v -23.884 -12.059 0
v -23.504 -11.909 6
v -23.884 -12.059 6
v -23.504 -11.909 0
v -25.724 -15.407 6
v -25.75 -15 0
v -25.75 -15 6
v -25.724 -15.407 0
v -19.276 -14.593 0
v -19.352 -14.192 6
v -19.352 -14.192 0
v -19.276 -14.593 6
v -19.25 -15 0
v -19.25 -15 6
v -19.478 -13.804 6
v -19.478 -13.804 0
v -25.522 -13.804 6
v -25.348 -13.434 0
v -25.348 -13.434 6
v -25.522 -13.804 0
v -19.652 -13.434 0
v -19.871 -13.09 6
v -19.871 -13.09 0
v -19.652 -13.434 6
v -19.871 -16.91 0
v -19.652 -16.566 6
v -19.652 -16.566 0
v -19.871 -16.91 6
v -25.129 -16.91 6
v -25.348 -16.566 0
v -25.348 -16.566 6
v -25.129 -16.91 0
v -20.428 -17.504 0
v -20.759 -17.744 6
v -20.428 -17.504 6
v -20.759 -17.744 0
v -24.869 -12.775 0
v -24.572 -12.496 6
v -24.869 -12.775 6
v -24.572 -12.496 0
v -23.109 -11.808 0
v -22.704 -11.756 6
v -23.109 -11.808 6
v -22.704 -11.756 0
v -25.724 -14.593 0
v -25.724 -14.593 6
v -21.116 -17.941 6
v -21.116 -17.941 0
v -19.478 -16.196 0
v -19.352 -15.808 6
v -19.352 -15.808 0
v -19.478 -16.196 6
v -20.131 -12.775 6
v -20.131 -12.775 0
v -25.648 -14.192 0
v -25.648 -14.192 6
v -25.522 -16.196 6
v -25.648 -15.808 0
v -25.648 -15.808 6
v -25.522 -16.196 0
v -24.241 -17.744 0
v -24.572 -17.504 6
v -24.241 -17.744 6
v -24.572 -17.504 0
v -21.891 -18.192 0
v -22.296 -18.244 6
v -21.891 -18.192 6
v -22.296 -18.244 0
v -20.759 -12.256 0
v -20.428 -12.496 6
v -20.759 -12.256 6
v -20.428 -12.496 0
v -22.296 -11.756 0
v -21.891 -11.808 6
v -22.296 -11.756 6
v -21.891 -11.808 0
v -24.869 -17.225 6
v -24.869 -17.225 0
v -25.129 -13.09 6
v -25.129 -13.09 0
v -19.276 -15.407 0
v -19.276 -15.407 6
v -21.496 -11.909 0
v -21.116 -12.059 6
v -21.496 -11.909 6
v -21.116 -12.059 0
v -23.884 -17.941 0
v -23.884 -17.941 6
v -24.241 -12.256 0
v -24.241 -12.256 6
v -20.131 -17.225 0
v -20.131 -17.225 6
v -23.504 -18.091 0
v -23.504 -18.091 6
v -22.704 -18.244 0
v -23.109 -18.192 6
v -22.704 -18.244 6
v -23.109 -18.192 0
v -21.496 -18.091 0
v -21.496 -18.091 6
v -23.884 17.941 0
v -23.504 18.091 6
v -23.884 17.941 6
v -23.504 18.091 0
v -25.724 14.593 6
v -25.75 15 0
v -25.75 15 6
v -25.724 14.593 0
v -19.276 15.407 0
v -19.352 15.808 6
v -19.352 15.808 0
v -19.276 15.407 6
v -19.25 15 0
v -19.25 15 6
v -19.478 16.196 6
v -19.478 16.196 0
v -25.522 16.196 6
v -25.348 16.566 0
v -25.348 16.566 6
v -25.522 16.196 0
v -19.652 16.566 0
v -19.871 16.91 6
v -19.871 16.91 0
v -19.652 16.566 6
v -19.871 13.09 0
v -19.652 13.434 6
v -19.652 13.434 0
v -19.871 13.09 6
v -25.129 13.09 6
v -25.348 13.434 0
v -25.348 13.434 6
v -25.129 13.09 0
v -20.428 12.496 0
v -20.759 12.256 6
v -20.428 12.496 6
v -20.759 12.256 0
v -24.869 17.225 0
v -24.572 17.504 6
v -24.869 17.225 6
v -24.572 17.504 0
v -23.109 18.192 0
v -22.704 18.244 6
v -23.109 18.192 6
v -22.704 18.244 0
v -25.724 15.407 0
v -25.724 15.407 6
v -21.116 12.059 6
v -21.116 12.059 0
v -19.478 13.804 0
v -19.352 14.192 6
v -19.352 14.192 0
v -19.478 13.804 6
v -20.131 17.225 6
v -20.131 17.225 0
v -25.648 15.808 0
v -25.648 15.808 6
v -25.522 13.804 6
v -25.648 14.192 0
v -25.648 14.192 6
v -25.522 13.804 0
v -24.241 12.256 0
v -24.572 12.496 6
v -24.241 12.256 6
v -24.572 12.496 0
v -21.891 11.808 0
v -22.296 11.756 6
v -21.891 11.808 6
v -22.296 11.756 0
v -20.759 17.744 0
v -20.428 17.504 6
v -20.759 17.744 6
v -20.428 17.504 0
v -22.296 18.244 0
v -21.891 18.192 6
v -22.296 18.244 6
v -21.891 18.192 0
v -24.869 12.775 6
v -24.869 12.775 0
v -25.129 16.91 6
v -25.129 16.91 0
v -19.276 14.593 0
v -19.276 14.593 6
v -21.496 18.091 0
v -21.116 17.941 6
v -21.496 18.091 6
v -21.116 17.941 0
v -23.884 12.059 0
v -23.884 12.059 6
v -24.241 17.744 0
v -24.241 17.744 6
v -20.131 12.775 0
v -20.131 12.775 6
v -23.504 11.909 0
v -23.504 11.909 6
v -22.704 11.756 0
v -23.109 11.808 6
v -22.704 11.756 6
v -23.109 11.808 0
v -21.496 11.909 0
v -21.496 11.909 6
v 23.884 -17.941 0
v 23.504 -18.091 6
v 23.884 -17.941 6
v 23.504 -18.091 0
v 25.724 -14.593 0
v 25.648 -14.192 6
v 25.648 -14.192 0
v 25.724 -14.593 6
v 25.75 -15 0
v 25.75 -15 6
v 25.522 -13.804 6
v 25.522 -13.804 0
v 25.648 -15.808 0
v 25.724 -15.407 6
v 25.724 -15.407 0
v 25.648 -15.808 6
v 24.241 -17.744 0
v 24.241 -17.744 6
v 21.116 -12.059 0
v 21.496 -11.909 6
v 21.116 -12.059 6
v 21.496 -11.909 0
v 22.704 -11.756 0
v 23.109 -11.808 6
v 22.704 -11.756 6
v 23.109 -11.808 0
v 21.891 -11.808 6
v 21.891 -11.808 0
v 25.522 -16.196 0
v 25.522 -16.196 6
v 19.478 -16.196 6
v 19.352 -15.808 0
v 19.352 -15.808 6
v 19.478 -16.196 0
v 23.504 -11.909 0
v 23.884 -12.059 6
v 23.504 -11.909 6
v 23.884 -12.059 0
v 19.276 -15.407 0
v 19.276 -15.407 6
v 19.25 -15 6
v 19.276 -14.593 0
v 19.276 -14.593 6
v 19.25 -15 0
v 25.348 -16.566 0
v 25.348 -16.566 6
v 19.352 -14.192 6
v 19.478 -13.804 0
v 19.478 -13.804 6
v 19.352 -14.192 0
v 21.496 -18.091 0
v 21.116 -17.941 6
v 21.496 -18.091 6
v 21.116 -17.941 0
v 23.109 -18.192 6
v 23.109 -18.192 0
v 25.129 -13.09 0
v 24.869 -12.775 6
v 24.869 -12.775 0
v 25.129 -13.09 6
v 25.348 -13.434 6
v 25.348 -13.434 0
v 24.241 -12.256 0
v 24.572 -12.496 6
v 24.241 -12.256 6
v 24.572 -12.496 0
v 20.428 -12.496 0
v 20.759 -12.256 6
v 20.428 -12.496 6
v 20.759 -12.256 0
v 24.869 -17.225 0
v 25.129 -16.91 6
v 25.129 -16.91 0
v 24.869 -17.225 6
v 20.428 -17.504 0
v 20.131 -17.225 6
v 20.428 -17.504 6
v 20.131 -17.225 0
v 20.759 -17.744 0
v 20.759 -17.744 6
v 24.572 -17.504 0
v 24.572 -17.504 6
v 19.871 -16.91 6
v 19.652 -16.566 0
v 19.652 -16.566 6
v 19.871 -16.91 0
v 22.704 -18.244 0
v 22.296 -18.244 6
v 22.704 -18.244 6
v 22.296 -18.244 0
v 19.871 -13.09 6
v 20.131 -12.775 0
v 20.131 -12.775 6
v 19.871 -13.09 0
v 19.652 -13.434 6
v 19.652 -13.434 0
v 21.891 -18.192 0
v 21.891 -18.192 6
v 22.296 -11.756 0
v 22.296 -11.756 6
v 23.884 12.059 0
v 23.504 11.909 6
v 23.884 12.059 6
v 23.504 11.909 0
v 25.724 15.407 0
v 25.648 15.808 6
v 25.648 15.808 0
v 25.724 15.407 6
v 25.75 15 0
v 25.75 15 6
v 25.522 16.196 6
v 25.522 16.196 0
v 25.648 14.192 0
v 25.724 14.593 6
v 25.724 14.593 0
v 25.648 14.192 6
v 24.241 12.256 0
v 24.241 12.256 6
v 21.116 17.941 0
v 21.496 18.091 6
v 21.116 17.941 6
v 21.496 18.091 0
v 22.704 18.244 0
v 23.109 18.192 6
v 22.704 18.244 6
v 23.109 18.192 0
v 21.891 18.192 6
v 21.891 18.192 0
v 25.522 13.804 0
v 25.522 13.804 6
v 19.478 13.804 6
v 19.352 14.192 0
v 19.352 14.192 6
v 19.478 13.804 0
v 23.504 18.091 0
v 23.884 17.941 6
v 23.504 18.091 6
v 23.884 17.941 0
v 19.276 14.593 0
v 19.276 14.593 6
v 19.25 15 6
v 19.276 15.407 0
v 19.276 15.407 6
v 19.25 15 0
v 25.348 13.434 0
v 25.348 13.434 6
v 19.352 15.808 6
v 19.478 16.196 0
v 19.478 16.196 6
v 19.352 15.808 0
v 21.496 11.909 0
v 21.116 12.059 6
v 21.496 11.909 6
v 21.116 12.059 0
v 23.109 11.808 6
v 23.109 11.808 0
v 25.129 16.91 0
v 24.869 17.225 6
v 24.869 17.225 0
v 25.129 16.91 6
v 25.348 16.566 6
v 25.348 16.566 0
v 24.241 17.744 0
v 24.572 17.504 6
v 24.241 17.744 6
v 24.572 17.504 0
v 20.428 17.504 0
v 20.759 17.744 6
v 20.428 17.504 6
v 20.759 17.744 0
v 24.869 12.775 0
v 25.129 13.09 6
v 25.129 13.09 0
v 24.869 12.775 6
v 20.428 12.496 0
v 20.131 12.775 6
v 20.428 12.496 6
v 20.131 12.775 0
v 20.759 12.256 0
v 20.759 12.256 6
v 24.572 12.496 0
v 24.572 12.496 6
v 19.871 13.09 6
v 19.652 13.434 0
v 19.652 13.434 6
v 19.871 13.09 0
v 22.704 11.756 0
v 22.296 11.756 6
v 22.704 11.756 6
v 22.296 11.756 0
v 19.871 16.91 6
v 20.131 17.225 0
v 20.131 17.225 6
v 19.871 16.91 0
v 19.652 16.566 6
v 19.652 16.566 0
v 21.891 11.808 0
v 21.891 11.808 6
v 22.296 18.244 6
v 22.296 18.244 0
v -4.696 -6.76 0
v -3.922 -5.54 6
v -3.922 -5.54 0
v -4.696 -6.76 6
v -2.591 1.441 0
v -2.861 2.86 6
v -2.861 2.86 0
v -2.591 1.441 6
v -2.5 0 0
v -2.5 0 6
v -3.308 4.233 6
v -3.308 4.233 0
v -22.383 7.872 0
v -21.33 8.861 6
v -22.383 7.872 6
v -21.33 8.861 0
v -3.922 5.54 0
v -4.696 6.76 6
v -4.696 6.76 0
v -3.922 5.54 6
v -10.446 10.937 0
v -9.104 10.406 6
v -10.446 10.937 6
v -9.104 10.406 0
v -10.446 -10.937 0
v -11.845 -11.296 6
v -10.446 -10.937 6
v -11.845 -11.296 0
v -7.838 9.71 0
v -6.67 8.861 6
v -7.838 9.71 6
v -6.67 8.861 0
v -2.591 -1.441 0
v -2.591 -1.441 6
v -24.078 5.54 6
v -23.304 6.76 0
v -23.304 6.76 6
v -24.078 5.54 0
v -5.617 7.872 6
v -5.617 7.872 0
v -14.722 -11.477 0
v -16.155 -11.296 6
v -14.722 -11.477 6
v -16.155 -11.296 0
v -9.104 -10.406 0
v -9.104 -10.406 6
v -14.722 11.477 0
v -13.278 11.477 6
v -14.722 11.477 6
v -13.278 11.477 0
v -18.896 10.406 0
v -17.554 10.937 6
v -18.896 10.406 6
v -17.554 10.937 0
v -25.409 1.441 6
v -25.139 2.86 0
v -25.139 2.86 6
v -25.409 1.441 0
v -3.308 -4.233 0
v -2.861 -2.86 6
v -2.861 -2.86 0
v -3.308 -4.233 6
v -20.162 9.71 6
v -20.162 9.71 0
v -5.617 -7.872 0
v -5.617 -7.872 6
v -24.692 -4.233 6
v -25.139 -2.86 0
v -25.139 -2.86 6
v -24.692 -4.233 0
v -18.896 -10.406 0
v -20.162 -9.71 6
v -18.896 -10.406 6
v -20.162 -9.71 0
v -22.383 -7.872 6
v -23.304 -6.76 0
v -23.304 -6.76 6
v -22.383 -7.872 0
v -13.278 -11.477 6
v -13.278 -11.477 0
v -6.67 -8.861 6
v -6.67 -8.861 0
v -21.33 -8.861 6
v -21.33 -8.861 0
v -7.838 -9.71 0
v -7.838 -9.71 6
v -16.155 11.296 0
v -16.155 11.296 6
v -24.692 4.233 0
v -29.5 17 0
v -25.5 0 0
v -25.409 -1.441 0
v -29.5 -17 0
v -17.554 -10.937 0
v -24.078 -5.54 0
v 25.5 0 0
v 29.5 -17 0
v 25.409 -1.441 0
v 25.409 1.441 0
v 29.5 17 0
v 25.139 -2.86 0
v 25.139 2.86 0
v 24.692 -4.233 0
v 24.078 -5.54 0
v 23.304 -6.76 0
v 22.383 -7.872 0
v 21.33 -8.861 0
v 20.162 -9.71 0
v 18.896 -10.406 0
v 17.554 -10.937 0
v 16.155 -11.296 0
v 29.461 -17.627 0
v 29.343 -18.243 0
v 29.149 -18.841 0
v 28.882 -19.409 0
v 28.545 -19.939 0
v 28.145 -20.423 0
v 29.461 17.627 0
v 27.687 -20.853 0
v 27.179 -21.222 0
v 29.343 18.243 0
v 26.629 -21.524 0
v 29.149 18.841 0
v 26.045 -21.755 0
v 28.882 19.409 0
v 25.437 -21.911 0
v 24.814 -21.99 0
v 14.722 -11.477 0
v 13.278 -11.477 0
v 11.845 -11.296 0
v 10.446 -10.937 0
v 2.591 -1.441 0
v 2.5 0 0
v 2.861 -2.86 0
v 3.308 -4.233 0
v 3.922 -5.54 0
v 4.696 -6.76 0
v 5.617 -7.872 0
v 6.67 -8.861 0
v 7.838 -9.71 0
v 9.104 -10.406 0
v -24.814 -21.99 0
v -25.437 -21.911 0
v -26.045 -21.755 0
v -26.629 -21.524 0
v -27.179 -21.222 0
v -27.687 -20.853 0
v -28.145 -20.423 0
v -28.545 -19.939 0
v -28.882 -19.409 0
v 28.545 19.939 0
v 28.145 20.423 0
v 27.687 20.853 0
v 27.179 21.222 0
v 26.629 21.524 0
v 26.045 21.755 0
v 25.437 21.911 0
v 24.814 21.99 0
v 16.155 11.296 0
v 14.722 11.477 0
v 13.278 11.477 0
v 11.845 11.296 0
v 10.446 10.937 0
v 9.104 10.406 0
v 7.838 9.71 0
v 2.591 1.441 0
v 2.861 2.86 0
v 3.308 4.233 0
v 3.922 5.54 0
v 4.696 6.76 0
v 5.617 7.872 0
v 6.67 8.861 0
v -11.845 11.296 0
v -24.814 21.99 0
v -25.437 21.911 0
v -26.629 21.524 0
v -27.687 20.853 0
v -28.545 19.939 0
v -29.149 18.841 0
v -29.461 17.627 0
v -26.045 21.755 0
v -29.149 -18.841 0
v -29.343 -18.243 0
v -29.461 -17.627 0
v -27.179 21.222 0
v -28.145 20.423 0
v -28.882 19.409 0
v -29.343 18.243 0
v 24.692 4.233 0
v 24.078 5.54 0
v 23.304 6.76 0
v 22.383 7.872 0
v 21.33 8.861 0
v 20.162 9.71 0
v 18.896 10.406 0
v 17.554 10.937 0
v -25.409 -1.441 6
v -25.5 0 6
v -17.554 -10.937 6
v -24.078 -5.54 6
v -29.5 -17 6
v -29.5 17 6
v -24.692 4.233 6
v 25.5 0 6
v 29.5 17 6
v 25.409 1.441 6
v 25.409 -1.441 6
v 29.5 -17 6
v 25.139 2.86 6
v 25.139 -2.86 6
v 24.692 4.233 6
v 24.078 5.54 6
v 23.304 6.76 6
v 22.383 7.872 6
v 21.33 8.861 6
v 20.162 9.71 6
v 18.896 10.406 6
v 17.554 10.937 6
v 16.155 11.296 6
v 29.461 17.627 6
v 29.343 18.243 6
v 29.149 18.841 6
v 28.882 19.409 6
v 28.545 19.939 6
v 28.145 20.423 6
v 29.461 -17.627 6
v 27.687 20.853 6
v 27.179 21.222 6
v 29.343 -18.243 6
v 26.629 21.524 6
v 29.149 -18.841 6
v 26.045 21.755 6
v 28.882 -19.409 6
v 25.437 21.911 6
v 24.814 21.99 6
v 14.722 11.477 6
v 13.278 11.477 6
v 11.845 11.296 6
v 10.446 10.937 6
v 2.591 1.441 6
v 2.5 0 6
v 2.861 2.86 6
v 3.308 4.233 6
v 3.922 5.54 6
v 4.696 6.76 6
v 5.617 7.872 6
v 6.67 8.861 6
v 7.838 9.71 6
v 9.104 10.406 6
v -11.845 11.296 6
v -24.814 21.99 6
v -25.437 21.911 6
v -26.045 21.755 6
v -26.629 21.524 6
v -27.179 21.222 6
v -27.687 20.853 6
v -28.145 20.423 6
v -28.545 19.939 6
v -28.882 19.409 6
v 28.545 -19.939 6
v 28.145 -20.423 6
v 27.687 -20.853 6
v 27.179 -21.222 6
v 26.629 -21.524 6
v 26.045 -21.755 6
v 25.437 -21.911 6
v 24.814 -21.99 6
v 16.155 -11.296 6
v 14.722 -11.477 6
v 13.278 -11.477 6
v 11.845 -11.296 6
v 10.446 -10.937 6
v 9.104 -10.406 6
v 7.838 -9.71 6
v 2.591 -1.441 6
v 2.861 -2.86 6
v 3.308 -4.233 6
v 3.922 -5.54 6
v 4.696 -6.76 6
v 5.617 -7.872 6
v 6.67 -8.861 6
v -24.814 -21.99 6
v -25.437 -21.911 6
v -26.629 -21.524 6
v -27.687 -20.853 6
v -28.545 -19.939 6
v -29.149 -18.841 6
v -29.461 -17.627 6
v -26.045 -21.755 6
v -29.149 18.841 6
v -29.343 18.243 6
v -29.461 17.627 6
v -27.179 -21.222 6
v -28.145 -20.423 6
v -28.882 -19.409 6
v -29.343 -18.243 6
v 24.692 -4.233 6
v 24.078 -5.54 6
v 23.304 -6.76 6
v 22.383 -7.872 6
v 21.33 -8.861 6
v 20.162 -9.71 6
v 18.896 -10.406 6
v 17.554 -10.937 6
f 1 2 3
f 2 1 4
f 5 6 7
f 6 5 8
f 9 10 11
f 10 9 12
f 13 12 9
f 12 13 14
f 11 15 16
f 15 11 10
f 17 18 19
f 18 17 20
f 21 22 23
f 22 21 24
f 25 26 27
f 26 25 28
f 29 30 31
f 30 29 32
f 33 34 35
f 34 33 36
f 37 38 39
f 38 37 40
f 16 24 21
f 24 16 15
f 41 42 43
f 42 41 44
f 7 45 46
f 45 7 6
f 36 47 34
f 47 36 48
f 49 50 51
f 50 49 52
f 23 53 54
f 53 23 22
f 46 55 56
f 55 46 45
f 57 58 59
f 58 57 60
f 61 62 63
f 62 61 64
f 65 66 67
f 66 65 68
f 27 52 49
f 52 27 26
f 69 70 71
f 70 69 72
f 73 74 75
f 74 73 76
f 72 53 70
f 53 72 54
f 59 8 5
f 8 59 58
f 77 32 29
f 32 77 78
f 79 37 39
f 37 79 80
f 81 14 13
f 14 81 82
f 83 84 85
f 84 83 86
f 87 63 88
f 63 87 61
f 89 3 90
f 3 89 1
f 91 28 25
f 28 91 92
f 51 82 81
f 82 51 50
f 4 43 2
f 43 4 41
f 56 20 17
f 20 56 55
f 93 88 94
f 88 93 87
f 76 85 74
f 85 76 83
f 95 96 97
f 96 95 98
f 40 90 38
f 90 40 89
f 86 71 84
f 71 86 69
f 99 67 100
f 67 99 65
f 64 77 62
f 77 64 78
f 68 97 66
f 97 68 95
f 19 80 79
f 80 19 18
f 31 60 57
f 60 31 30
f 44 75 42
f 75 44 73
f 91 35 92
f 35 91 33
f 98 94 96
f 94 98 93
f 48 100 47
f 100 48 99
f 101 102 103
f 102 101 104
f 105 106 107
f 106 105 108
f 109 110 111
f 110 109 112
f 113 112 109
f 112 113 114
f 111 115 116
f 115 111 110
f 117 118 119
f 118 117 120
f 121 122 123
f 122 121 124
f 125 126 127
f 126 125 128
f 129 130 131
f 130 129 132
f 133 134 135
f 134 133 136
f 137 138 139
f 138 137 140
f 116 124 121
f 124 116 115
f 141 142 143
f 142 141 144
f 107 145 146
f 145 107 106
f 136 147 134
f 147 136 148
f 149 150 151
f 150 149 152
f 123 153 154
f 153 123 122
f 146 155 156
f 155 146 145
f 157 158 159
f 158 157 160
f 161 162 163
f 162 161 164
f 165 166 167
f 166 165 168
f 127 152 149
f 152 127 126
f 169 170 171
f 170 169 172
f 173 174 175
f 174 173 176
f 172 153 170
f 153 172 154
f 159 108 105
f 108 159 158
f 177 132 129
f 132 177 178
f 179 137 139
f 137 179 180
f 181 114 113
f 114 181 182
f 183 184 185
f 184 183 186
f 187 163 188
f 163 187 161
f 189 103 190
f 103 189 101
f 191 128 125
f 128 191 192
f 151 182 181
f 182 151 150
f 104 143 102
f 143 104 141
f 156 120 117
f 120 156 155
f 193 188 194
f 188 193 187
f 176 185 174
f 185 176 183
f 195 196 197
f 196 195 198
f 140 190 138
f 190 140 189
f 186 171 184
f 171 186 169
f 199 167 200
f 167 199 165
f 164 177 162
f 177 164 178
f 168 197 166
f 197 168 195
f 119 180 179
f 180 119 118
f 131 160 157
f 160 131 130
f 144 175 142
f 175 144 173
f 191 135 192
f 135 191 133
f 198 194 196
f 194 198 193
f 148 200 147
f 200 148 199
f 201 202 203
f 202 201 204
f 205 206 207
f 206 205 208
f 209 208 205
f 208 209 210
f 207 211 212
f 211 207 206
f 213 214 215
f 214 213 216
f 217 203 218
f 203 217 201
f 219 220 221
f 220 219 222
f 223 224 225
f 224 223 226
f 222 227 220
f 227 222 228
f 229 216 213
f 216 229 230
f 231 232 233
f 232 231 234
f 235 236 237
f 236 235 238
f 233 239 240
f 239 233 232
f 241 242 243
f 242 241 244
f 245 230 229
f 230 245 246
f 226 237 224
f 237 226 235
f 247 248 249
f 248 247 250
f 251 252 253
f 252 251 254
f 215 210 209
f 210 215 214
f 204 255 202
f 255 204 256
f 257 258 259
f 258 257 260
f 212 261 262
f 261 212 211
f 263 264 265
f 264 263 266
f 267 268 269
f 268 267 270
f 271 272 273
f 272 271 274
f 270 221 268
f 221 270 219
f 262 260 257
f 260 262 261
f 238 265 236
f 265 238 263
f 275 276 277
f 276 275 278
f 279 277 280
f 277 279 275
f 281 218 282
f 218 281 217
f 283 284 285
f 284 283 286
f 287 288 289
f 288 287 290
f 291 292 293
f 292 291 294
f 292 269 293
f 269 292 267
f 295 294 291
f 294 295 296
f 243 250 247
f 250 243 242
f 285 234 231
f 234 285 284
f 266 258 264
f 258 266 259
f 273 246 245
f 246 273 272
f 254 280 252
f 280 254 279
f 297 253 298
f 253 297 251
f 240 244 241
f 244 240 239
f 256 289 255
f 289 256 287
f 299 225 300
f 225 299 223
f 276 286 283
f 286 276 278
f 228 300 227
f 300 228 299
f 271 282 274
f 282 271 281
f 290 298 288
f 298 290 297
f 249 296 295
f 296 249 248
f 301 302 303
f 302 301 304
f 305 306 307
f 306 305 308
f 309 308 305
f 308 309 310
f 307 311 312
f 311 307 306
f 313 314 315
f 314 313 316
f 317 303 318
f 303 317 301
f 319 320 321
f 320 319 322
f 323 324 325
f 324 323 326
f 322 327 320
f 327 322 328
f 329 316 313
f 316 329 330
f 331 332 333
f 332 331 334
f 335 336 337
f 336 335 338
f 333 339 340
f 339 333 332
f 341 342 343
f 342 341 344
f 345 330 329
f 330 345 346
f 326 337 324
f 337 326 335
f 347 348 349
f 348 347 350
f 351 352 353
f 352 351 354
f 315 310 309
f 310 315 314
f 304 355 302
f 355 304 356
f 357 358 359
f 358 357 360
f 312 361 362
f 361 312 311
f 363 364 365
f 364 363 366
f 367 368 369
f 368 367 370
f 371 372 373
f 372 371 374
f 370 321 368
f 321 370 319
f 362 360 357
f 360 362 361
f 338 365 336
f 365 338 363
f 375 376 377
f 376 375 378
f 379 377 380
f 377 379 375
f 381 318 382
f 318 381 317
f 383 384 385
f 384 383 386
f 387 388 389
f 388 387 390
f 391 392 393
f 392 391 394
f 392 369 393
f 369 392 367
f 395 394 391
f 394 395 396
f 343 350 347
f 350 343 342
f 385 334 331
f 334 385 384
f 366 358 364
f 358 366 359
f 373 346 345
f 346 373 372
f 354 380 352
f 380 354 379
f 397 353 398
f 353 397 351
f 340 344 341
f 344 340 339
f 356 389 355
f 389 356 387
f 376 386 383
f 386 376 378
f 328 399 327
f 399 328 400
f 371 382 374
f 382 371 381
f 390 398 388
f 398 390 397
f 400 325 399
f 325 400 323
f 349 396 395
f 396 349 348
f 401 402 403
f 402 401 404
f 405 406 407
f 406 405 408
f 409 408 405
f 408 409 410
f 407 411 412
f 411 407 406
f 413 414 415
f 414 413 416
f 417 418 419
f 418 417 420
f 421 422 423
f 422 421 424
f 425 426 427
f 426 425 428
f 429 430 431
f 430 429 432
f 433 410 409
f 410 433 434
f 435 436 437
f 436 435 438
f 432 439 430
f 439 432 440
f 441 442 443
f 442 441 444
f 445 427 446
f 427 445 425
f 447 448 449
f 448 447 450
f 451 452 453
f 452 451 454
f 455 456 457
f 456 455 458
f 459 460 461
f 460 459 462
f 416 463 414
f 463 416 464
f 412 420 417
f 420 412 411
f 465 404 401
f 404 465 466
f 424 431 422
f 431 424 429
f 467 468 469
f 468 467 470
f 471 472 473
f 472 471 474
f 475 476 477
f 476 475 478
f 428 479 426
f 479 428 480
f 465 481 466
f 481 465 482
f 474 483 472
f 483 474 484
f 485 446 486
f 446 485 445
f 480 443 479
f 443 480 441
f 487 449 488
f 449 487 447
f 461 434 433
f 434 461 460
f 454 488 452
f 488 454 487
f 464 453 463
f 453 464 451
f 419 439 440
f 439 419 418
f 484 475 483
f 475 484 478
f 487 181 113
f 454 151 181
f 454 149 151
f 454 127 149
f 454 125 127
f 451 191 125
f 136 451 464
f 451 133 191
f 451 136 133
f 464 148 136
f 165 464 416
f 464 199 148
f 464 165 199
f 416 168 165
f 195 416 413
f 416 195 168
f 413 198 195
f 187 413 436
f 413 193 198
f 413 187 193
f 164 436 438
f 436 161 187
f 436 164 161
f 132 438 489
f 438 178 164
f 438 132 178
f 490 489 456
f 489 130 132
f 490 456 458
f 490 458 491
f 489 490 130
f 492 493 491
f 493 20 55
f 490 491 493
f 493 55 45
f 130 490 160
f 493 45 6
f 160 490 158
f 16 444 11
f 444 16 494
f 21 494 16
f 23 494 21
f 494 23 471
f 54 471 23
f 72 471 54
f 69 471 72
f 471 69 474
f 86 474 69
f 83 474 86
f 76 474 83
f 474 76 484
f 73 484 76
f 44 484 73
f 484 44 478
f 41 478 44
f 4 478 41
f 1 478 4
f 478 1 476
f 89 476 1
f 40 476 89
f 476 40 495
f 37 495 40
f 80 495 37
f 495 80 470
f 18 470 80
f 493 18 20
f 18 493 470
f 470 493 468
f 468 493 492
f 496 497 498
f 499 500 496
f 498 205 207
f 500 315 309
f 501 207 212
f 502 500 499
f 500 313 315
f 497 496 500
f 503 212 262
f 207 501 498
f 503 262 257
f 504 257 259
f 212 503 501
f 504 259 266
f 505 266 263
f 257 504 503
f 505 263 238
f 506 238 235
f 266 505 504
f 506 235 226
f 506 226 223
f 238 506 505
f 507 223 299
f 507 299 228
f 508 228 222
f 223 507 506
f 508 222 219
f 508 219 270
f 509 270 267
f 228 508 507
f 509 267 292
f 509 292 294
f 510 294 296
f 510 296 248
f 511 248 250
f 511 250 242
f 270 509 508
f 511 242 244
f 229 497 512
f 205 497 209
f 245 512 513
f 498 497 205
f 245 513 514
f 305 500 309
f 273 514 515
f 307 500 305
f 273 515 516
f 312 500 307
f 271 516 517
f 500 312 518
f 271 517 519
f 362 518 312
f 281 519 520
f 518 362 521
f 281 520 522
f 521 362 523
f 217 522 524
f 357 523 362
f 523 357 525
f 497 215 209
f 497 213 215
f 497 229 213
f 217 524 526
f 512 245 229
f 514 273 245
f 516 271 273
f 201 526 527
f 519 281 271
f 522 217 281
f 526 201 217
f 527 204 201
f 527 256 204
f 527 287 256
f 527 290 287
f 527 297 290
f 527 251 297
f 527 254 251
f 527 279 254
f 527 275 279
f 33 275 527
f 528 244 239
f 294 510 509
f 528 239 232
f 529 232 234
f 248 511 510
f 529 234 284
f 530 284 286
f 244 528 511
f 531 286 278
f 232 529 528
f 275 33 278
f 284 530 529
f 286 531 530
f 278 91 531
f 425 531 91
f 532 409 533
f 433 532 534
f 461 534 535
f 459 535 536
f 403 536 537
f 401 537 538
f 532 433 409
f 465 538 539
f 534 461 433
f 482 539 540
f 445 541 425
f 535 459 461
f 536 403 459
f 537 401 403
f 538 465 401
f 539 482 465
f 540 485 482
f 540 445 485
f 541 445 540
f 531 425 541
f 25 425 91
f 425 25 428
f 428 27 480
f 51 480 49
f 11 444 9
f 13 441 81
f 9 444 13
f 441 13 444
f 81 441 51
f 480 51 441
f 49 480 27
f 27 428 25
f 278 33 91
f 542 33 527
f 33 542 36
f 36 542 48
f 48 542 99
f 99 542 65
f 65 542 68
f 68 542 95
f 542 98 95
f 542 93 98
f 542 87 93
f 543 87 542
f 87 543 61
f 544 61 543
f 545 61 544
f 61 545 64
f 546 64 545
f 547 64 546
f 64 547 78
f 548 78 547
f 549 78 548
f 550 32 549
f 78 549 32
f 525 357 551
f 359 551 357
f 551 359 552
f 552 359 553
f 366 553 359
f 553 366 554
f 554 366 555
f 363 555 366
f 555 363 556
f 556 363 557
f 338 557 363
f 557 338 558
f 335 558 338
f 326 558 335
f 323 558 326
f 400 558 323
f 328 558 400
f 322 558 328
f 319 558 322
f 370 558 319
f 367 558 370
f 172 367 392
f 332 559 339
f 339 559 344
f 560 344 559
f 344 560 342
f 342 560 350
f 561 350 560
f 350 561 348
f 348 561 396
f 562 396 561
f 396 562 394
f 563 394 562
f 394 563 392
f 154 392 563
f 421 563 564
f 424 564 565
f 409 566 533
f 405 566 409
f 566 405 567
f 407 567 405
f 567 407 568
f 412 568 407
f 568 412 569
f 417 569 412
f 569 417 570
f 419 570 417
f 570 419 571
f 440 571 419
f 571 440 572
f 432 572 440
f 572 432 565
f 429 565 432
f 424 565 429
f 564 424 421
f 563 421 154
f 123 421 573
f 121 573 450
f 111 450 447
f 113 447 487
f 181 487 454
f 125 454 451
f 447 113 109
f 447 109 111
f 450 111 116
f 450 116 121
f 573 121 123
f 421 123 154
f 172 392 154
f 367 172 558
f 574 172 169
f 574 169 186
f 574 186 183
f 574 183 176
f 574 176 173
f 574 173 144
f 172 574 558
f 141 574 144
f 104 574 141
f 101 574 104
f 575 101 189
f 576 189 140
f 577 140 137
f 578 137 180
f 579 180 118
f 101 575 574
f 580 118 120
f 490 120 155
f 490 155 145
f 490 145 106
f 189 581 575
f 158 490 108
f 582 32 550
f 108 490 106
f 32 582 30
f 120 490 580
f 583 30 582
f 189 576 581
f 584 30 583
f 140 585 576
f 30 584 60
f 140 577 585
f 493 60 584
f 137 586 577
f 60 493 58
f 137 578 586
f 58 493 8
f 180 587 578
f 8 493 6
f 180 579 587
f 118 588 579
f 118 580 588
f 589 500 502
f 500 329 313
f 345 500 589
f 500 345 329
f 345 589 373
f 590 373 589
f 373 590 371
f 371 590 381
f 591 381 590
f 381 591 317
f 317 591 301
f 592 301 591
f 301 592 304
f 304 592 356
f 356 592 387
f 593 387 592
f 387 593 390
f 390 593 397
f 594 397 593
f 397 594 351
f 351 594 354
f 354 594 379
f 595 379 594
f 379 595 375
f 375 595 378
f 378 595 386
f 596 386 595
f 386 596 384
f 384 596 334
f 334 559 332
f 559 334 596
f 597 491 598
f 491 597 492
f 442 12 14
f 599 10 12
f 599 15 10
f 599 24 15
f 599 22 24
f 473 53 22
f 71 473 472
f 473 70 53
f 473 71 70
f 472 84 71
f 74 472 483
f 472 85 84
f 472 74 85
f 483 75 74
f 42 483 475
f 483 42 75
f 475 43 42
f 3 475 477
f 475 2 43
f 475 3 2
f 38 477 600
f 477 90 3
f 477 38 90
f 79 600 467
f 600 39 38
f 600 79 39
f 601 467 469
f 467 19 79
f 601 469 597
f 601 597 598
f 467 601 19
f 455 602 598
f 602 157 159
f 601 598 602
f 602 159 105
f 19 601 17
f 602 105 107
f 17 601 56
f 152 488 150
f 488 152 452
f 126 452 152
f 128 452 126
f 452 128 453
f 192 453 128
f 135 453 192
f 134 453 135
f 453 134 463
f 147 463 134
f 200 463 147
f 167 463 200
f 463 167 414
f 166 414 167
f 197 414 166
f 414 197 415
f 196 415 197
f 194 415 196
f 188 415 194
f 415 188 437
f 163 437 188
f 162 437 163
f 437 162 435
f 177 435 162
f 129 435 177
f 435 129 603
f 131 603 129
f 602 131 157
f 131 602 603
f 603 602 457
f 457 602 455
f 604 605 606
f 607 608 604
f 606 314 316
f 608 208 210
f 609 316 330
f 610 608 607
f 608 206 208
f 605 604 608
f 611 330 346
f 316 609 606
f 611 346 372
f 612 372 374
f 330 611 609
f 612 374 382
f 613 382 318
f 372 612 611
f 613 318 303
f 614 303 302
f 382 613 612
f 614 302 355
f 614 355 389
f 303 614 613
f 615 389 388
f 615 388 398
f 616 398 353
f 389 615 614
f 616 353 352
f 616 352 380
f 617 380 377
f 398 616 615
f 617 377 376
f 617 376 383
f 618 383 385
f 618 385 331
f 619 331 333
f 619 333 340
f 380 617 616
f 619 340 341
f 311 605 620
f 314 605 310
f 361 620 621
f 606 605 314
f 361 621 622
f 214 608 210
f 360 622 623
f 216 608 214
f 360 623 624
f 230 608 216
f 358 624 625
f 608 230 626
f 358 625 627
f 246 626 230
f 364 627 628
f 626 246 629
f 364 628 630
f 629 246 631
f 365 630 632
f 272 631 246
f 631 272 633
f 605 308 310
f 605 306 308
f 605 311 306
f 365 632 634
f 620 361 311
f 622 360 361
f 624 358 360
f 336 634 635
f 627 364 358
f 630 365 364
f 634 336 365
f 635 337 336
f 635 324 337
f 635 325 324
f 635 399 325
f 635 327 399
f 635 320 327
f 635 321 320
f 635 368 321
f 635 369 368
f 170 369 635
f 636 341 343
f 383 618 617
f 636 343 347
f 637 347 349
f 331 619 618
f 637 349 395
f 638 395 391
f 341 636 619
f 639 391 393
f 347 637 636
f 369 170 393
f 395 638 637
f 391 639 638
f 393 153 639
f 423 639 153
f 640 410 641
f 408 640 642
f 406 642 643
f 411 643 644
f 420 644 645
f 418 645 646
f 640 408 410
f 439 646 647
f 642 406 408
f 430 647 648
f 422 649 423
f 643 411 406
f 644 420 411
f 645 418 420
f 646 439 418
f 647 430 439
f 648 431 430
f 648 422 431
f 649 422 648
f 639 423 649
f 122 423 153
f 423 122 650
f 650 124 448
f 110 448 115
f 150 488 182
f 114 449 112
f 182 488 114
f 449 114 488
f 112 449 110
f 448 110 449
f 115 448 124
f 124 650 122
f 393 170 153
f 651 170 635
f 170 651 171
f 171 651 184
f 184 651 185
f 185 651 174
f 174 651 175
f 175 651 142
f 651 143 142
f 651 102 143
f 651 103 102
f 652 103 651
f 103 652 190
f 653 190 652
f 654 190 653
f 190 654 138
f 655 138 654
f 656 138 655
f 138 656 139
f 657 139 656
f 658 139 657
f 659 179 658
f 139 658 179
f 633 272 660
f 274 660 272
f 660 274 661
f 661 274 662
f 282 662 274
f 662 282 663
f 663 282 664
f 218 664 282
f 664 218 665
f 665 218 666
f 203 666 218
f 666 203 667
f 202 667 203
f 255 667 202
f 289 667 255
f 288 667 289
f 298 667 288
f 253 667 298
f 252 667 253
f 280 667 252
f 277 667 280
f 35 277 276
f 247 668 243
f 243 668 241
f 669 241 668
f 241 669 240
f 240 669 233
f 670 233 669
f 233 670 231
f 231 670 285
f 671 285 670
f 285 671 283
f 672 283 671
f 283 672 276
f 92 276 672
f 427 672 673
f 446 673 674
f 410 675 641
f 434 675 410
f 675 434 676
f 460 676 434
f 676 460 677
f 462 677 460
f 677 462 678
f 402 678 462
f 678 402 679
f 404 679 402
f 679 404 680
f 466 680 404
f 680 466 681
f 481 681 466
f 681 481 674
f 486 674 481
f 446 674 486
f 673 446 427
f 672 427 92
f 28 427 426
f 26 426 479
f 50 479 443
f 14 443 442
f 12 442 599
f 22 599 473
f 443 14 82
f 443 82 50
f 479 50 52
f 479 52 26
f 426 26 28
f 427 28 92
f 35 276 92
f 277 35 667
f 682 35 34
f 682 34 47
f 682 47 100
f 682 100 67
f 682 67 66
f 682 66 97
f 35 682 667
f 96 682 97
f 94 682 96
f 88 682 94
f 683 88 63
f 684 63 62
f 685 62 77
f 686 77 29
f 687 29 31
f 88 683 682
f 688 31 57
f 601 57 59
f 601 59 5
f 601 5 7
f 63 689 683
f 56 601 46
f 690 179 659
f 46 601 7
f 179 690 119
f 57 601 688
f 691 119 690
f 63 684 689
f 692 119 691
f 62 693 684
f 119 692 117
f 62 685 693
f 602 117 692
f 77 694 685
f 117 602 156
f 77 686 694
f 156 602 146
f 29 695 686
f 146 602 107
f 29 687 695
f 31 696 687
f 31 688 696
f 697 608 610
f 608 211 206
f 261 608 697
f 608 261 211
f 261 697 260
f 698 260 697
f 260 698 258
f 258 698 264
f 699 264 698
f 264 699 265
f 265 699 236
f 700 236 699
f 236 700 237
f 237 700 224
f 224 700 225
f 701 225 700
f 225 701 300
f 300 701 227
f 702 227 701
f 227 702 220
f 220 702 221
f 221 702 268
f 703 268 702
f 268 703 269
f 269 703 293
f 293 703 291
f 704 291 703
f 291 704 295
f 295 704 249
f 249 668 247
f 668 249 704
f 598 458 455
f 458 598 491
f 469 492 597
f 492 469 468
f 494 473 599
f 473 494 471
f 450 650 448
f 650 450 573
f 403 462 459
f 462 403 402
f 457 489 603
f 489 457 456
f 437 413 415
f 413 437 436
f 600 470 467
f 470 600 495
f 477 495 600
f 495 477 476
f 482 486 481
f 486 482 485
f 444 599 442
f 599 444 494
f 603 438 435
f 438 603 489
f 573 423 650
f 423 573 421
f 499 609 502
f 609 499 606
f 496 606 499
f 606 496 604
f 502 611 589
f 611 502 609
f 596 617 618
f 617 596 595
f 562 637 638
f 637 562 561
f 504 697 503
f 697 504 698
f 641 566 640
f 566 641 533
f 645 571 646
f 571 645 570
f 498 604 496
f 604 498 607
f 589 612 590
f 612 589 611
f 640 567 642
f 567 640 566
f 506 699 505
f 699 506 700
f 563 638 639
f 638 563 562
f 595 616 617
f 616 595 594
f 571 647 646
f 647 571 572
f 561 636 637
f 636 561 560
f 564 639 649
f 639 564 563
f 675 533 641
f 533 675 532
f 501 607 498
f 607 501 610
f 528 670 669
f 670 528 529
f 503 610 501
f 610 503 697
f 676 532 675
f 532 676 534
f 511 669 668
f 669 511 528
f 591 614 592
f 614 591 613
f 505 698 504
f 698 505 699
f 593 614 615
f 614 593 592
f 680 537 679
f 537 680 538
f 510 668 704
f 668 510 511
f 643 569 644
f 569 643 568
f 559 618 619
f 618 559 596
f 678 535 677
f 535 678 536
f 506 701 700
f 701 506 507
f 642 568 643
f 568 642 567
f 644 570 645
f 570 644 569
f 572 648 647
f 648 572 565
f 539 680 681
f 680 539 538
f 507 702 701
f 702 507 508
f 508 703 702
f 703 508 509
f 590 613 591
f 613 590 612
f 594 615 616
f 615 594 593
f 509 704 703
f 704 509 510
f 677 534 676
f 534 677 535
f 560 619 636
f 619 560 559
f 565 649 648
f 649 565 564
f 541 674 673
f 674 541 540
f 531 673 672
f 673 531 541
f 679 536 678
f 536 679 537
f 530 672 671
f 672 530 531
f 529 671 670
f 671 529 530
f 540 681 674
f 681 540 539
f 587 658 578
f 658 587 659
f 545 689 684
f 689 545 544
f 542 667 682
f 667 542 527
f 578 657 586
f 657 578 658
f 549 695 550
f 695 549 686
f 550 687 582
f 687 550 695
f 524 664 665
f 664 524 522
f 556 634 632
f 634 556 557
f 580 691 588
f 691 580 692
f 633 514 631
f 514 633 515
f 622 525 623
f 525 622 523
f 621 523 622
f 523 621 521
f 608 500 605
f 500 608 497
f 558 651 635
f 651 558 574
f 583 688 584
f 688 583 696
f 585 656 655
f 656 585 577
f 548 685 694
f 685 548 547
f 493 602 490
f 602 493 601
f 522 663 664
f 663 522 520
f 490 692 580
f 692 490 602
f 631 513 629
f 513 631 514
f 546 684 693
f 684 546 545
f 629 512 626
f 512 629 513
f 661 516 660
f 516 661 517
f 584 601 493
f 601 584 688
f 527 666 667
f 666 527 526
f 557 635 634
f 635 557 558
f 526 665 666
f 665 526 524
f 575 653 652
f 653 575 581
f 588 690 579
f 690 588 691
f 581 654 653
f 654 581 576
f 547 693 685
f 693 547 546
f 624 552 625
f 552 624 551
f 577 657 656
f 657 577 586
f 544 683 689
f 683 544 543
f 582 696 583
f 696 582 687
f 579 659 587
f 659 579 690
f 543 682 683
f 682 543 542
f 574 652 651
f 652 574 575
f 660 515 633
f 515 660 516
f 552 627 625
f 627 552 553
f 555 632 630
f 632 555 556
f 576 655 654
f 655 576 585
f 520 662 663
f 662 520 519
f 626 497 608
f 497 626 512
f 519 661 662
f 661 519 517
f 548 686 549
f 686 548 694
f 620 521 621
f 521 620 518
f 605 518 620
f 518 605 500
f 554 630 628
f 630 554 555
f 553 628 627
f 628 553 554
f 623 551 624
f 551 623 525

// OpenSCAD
$fn = 50;


difference() {
	union() {
		hull() {
			translate(v = [-24.5000000000, 17.0000000000, 0]) {
				cylinder(h = 6, r = 5);
			}
			translate(v = [24.5000000000, 17.0000000000, 0]) {
				cylinder(h = 6, r = 5);
			}
			translate(v = [-24.5000000000, -17.0000000000, 0]) {
				cylinder(h = 6, r = 5);
			}
			translate(v = [24.5000000000, -17.0000000000, 0]) {
				cylinder(h = 6, r = 5);
			}
		}
	}
	union() {
		#translate(v = [-22.5000000000, -15.0000000000, -100.0000000000]) {
			cylinder(h = 200, r = 3.2500000000);
		}
		#translate(v = [-22.5000000000, 15.0000000000, -100.0000000000]) {
			cylinder(h = 200, r = 3.2500000000);
		}
		#translate(v = [22.5000000000, -15.0000000000, -100.0000000000]) {
			cylinder(h = 200, r = 3.2500000000);
		}
		#translate(v = [22.5000000000, 15.0000000000, -100.0000000000]) {
			cylinder(h = 200, r = 3.2500000000);
		}
		#translate(v = [-14.0000000000, 0, 0]) {
			cylinder(h = 6, r = 11.5000000000);
		}
		#translate(v = [14.0000000000, 0, 0]) {
			cylinder(h = 6, r = 11.5000000000);
		}
	}
}
